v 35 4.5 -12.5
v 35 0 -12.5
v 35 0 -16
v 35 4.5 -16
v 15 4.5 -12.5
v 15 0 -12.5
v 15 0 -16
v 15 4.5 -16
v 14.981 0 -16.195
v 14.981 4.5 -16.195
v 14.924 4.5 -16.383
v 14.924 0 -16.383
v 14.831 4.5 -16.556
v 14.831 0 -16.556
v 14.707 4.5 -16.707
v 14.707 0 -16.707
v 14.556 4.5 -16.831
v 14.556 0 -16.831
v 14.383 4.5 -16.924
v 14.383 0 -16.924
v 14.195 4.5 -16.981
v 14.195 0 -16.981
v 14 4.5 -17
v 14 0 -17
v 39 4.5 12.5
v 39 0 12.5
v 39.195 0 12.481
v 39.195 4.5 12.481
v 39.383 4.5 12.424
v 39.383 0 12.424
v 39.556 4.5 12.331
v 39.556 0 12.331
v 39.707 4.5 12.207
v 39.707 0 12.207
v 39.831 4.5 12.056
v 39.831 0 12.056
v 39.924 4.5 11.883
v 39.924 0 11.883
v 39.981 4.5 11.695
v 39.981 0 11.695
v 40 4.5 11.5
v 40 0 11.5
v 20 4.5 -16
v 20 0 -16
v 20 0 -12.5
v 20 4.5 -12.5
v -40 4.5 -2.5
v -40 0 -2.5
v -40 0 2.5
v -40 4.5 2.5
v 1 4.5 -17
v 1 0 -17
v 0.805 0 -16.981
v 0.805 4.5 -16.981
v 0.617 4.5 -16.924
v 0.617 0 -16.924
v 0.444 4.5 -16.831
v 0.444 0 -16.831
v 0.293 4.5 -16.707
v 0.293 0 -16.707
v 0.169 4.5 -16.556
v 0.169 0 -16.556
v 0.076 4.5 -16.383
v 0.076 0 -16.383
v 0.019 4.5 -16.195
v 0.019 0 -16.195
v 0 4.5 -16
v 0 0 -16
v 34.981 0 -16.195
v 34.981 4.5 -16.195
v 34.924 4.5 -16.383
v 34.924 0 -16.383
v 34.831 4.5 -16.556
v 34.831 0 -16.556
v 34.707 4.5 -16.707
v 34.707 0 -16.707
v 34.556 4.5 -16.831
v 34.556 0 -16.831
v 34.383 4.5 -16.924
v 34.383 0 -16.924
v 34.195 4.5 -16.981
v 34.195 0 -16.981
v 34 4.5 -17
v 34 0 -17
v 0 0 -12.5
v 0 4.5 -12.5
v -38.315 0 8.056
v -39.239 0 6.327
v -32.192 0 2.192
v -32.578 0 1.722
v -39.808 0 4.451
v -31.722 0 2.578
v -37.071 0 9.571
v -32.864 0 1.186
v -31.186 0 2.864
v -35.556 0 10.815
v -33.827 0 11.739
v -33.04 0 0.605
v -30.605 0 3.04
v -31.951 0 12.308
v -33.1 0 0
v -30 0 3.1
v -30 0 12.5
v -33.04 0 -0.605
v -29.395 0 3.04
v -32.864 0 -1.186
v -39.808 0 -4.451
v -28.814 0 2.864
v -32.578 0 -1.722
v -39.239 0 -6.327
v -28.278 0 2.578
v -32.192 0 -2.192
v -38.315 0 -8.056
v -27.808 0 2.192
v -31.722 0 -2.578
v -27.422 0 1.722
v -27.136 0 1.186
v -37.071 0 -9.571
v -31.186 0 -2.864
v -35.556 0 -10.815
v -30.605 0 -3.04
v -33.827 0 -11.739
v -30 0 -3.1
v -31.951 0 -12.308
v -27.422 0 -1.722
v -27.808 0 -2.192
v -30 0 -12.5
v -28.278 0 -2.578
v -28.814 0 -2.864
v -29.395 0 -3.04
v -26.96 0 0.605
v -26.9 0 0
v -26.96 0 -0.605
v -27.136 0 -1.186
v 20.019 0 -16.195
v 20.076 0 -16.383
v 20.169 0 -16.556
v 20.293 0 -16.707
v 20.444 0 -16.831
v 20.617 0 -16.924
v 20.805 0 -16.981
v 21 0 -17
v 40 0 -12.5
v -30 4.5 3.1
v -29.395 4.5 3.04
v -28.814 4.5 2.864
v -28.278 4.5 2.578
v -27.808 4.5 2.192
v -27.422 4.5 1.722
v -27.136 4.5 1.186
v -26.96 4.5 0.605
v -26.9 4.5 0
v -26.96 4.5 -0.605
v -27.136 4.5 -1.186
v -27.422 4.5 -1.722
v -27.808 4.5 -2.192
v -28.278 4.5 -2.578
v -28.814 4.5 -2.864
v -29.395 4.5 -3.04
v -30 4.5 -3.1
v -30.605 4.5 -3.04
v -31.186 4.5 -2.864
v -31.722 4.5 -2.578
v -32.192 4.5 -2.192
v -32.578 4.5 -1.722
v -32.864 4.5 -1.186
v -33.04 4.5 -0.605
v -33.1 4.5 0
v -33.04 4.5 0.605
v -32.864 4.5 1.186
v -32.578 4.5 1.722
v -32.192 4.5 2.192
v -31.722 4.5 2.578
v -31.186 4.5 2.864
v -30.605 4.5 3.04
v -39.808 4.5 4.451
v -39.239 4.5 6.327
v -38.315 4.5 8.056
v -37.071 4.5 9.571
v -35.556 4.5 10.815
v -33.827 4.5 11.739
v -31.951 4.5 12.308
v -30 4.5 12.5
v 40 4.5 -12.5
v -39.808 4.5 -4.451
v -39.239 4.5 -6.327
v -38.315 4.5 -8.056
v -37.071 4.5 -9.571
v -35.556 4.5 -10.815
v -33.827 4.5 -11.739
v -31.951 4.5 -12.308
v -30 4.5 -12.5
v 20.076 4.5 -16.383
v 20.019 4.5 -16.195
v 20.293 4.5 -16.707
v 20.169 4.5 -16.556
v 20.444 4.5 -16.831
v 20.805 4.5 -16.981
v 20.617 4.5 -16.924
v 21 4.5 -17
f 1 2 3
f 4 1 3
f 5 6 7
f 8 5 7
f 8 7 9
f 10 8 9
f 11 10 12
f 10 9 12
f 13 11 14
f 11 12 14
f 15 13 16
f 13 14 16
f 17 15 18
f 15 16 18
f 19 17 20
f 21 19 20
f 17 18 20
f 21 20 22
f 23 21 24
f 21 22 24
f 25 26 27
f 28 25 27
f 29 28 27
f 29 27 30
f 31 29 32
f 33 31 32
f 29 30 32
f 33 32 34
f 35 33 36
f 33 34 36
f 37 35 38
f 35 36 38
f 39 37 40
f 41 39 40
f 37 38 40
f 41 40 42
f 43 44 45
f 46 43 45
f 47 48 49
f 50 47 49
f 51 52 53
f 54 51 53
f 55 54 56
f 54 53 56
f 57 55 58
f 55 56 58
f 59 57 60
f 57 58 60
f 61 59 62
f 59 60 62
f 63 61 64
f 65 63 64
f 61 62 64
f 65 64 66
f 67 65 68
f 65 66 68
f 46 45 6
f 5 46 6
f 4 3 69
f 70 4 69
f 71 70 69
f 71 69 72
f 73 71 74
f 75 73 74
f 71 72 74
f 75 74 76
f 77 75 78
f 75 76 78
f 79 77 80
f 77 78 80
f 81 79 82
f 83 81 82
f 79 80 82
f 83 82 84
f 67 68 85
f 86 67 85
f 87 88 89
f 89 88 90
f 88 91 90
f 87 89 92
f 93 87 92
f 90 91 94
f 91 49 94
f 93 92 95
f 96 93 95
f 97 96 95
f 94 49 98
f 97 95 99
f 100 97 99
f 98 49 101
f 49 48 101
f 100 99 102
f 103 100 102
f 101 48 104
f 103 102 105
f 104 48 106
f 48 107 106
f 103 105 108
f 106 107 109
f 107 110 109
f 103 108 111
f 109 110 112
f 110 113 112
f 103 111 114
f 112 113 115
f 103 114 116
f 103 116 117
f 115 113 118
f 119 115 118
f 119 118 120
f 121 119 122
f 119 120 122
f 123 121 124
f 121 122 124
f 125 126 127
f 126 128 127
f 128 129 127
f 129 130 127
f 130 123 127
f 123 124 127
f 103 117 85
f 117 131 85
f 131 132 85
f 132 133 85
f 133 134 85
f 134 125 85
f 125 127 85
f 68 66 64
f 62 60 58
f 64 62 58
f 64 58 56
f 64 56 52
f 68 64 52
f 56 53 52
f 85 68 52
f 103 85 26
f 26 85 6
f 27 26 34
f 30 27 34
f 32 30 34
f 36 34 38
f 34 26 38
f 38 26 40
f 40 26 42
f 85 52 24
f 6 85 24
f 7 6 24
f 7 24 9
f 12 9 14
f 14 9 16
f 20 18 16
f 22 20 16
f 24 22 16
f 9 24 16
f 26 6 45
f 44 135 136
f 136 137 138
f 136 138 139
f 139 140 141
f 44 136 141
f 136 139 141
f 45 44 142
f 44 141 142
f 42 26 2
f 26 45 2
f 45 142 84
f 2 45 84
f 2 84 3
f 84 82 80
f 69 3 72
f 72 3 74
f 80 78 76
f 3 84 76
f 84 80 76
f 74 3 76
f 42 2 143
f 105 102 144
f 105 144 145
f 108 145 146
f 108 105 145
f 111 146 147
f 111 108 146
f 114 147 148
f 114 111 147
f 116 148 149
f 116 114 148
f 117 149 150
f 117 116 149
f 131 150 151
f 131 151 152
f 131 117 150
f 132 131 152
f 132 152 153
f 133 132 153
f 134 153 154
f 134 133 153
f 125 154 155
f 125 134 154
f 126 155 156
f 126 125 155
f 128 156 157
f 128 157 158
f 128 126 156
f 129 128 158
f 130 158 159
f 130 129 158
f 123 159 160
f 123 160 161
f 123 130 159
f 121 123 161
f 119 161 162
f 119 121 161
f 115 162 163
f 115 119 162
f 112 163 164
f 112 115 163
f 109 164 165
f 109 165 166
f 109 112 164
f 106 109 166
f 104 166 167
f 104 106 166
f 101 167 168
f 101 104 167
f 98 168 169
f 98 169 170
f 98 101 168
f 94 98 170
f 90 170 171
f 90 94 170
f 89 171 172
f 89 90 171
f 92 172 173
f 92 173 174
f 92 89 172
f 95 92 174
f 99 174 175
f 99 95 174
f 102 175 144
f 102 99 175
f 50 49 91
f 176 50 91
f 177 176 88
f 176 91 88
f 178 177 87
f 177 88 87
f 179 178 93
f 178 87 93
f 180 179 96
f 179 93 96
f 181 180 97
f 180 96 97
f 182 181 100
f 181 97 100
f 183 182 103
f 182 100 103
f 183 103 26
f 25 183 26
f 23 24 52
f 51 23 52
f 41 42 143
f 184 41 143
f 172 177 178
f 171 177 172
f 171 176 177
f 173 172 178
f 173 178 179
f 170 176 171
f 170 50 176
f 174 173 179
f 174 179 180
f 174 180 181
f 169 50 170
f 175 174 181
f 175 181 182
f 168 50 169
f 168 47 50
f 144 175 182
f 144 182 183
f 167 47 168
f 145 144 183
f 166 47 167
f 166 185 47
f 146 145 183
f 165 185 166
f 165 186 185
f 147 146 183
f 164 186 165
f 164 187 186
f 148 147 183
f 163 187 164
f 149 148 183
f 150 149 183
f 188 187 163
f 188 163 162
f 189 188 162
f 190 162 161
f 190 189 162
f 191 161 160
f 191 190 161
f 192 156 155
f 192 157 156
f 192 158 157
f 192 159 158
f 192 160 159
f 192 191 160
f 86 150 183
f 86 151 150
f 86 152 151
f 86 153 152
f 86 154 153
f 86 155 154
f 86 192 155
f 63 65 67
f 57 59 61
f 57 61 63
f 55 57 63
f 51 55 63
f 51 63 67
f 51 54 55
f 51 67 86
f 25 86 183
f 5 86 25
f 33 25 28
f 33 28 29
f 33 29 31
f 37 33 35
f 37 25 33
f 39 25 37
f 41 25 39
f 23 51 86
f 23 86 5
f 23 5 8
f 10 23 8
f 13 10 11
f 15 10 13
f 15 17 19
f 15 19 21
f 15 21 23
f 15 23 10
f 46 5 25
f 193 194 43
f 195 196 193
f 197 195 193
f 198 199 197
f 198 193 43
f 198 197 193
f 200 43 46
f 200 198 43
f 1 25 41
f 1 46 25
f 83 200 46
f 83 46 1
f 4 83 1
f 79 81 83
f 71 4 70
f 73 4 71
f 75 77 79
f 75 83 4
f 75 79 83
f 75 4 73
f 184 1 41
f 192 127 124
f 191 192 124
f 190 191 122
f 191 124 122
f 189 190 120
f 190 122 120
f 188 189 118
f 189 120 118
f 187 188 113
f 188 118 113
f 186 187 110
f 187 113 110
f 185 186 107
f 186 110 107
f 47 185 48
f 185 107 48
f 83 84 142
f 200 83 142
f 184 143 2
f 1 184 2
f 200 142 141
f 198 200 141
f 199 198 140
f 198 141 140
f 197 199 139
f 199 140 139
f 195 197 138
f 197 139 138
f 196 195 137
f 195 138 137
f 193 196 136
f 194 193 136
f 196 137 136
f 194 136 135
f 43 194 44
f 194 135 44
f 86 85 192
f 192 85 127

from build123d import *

# Parameters (mm, degrees)
SKETCH1_R           = 3.1
BOSS_EXTRUDE1_DEPTH = 4.5


with BuildPart() as part:
    # Sketch1 → Boss-Extrude1 (new body)
    with BuildSketch(Plane(origin=(0, 0, 0), x_dir=(1, 0, 0), z_dir=(0, 1, 0))):
        with BuildLine():
            Line((-30, -12.5), (39, -12.5))
            ThreePointArc((39, -12.5), (39.707106781, -12.207106781), (40, -11.5))
            Line((40, -11.5), (40, 12.5))
            Line((40, 12.5), (35, 12.5))
            Line((35, 12.5), (35, 16))
            ThreePointArc((35, 16), (34.707106781, 16.707106781), (34, 17))
            Line((34, 17), (21, 17))
            ThreePointArc((21, 17), (20.292893219, 16.707106781), (20, 16))
            Line((20, 16), (20, 12.5))
            Line((20, 12.5), (15, 12.5))
            Line((15, 12.5), (15, 16))
            ThreePointArc((15, 16), (14.707106781, 16.707106781), (14, 17))
            Line((14, 17), (1, 17))
            ThreePointArc((1, 17), (0.292893219, 16.707106781), (0, 16))
            Line((0, 16), (0, 12.5))
            Line((0, 12.5), (-30, 12.5))
            ThreePointArc((-30, 12.5), (-37.071067812, 9.571067812), (-40, 2.5))
            Line((-40, 2.5), (-40, -2.5))
            ThreePointArc((-40, -2.5), (-37.071067812, -9.571067812), (-30, -12.5))
        make_face()
        with Locations(Location((-30, 0, 0), (0, 0, 270))):
            Circle(SKETCH1_R, mode=Mode.SUBTRACT)
    extrude(amount=BOSS_EXTRUDE1_DEPTH)


solid = part.part
